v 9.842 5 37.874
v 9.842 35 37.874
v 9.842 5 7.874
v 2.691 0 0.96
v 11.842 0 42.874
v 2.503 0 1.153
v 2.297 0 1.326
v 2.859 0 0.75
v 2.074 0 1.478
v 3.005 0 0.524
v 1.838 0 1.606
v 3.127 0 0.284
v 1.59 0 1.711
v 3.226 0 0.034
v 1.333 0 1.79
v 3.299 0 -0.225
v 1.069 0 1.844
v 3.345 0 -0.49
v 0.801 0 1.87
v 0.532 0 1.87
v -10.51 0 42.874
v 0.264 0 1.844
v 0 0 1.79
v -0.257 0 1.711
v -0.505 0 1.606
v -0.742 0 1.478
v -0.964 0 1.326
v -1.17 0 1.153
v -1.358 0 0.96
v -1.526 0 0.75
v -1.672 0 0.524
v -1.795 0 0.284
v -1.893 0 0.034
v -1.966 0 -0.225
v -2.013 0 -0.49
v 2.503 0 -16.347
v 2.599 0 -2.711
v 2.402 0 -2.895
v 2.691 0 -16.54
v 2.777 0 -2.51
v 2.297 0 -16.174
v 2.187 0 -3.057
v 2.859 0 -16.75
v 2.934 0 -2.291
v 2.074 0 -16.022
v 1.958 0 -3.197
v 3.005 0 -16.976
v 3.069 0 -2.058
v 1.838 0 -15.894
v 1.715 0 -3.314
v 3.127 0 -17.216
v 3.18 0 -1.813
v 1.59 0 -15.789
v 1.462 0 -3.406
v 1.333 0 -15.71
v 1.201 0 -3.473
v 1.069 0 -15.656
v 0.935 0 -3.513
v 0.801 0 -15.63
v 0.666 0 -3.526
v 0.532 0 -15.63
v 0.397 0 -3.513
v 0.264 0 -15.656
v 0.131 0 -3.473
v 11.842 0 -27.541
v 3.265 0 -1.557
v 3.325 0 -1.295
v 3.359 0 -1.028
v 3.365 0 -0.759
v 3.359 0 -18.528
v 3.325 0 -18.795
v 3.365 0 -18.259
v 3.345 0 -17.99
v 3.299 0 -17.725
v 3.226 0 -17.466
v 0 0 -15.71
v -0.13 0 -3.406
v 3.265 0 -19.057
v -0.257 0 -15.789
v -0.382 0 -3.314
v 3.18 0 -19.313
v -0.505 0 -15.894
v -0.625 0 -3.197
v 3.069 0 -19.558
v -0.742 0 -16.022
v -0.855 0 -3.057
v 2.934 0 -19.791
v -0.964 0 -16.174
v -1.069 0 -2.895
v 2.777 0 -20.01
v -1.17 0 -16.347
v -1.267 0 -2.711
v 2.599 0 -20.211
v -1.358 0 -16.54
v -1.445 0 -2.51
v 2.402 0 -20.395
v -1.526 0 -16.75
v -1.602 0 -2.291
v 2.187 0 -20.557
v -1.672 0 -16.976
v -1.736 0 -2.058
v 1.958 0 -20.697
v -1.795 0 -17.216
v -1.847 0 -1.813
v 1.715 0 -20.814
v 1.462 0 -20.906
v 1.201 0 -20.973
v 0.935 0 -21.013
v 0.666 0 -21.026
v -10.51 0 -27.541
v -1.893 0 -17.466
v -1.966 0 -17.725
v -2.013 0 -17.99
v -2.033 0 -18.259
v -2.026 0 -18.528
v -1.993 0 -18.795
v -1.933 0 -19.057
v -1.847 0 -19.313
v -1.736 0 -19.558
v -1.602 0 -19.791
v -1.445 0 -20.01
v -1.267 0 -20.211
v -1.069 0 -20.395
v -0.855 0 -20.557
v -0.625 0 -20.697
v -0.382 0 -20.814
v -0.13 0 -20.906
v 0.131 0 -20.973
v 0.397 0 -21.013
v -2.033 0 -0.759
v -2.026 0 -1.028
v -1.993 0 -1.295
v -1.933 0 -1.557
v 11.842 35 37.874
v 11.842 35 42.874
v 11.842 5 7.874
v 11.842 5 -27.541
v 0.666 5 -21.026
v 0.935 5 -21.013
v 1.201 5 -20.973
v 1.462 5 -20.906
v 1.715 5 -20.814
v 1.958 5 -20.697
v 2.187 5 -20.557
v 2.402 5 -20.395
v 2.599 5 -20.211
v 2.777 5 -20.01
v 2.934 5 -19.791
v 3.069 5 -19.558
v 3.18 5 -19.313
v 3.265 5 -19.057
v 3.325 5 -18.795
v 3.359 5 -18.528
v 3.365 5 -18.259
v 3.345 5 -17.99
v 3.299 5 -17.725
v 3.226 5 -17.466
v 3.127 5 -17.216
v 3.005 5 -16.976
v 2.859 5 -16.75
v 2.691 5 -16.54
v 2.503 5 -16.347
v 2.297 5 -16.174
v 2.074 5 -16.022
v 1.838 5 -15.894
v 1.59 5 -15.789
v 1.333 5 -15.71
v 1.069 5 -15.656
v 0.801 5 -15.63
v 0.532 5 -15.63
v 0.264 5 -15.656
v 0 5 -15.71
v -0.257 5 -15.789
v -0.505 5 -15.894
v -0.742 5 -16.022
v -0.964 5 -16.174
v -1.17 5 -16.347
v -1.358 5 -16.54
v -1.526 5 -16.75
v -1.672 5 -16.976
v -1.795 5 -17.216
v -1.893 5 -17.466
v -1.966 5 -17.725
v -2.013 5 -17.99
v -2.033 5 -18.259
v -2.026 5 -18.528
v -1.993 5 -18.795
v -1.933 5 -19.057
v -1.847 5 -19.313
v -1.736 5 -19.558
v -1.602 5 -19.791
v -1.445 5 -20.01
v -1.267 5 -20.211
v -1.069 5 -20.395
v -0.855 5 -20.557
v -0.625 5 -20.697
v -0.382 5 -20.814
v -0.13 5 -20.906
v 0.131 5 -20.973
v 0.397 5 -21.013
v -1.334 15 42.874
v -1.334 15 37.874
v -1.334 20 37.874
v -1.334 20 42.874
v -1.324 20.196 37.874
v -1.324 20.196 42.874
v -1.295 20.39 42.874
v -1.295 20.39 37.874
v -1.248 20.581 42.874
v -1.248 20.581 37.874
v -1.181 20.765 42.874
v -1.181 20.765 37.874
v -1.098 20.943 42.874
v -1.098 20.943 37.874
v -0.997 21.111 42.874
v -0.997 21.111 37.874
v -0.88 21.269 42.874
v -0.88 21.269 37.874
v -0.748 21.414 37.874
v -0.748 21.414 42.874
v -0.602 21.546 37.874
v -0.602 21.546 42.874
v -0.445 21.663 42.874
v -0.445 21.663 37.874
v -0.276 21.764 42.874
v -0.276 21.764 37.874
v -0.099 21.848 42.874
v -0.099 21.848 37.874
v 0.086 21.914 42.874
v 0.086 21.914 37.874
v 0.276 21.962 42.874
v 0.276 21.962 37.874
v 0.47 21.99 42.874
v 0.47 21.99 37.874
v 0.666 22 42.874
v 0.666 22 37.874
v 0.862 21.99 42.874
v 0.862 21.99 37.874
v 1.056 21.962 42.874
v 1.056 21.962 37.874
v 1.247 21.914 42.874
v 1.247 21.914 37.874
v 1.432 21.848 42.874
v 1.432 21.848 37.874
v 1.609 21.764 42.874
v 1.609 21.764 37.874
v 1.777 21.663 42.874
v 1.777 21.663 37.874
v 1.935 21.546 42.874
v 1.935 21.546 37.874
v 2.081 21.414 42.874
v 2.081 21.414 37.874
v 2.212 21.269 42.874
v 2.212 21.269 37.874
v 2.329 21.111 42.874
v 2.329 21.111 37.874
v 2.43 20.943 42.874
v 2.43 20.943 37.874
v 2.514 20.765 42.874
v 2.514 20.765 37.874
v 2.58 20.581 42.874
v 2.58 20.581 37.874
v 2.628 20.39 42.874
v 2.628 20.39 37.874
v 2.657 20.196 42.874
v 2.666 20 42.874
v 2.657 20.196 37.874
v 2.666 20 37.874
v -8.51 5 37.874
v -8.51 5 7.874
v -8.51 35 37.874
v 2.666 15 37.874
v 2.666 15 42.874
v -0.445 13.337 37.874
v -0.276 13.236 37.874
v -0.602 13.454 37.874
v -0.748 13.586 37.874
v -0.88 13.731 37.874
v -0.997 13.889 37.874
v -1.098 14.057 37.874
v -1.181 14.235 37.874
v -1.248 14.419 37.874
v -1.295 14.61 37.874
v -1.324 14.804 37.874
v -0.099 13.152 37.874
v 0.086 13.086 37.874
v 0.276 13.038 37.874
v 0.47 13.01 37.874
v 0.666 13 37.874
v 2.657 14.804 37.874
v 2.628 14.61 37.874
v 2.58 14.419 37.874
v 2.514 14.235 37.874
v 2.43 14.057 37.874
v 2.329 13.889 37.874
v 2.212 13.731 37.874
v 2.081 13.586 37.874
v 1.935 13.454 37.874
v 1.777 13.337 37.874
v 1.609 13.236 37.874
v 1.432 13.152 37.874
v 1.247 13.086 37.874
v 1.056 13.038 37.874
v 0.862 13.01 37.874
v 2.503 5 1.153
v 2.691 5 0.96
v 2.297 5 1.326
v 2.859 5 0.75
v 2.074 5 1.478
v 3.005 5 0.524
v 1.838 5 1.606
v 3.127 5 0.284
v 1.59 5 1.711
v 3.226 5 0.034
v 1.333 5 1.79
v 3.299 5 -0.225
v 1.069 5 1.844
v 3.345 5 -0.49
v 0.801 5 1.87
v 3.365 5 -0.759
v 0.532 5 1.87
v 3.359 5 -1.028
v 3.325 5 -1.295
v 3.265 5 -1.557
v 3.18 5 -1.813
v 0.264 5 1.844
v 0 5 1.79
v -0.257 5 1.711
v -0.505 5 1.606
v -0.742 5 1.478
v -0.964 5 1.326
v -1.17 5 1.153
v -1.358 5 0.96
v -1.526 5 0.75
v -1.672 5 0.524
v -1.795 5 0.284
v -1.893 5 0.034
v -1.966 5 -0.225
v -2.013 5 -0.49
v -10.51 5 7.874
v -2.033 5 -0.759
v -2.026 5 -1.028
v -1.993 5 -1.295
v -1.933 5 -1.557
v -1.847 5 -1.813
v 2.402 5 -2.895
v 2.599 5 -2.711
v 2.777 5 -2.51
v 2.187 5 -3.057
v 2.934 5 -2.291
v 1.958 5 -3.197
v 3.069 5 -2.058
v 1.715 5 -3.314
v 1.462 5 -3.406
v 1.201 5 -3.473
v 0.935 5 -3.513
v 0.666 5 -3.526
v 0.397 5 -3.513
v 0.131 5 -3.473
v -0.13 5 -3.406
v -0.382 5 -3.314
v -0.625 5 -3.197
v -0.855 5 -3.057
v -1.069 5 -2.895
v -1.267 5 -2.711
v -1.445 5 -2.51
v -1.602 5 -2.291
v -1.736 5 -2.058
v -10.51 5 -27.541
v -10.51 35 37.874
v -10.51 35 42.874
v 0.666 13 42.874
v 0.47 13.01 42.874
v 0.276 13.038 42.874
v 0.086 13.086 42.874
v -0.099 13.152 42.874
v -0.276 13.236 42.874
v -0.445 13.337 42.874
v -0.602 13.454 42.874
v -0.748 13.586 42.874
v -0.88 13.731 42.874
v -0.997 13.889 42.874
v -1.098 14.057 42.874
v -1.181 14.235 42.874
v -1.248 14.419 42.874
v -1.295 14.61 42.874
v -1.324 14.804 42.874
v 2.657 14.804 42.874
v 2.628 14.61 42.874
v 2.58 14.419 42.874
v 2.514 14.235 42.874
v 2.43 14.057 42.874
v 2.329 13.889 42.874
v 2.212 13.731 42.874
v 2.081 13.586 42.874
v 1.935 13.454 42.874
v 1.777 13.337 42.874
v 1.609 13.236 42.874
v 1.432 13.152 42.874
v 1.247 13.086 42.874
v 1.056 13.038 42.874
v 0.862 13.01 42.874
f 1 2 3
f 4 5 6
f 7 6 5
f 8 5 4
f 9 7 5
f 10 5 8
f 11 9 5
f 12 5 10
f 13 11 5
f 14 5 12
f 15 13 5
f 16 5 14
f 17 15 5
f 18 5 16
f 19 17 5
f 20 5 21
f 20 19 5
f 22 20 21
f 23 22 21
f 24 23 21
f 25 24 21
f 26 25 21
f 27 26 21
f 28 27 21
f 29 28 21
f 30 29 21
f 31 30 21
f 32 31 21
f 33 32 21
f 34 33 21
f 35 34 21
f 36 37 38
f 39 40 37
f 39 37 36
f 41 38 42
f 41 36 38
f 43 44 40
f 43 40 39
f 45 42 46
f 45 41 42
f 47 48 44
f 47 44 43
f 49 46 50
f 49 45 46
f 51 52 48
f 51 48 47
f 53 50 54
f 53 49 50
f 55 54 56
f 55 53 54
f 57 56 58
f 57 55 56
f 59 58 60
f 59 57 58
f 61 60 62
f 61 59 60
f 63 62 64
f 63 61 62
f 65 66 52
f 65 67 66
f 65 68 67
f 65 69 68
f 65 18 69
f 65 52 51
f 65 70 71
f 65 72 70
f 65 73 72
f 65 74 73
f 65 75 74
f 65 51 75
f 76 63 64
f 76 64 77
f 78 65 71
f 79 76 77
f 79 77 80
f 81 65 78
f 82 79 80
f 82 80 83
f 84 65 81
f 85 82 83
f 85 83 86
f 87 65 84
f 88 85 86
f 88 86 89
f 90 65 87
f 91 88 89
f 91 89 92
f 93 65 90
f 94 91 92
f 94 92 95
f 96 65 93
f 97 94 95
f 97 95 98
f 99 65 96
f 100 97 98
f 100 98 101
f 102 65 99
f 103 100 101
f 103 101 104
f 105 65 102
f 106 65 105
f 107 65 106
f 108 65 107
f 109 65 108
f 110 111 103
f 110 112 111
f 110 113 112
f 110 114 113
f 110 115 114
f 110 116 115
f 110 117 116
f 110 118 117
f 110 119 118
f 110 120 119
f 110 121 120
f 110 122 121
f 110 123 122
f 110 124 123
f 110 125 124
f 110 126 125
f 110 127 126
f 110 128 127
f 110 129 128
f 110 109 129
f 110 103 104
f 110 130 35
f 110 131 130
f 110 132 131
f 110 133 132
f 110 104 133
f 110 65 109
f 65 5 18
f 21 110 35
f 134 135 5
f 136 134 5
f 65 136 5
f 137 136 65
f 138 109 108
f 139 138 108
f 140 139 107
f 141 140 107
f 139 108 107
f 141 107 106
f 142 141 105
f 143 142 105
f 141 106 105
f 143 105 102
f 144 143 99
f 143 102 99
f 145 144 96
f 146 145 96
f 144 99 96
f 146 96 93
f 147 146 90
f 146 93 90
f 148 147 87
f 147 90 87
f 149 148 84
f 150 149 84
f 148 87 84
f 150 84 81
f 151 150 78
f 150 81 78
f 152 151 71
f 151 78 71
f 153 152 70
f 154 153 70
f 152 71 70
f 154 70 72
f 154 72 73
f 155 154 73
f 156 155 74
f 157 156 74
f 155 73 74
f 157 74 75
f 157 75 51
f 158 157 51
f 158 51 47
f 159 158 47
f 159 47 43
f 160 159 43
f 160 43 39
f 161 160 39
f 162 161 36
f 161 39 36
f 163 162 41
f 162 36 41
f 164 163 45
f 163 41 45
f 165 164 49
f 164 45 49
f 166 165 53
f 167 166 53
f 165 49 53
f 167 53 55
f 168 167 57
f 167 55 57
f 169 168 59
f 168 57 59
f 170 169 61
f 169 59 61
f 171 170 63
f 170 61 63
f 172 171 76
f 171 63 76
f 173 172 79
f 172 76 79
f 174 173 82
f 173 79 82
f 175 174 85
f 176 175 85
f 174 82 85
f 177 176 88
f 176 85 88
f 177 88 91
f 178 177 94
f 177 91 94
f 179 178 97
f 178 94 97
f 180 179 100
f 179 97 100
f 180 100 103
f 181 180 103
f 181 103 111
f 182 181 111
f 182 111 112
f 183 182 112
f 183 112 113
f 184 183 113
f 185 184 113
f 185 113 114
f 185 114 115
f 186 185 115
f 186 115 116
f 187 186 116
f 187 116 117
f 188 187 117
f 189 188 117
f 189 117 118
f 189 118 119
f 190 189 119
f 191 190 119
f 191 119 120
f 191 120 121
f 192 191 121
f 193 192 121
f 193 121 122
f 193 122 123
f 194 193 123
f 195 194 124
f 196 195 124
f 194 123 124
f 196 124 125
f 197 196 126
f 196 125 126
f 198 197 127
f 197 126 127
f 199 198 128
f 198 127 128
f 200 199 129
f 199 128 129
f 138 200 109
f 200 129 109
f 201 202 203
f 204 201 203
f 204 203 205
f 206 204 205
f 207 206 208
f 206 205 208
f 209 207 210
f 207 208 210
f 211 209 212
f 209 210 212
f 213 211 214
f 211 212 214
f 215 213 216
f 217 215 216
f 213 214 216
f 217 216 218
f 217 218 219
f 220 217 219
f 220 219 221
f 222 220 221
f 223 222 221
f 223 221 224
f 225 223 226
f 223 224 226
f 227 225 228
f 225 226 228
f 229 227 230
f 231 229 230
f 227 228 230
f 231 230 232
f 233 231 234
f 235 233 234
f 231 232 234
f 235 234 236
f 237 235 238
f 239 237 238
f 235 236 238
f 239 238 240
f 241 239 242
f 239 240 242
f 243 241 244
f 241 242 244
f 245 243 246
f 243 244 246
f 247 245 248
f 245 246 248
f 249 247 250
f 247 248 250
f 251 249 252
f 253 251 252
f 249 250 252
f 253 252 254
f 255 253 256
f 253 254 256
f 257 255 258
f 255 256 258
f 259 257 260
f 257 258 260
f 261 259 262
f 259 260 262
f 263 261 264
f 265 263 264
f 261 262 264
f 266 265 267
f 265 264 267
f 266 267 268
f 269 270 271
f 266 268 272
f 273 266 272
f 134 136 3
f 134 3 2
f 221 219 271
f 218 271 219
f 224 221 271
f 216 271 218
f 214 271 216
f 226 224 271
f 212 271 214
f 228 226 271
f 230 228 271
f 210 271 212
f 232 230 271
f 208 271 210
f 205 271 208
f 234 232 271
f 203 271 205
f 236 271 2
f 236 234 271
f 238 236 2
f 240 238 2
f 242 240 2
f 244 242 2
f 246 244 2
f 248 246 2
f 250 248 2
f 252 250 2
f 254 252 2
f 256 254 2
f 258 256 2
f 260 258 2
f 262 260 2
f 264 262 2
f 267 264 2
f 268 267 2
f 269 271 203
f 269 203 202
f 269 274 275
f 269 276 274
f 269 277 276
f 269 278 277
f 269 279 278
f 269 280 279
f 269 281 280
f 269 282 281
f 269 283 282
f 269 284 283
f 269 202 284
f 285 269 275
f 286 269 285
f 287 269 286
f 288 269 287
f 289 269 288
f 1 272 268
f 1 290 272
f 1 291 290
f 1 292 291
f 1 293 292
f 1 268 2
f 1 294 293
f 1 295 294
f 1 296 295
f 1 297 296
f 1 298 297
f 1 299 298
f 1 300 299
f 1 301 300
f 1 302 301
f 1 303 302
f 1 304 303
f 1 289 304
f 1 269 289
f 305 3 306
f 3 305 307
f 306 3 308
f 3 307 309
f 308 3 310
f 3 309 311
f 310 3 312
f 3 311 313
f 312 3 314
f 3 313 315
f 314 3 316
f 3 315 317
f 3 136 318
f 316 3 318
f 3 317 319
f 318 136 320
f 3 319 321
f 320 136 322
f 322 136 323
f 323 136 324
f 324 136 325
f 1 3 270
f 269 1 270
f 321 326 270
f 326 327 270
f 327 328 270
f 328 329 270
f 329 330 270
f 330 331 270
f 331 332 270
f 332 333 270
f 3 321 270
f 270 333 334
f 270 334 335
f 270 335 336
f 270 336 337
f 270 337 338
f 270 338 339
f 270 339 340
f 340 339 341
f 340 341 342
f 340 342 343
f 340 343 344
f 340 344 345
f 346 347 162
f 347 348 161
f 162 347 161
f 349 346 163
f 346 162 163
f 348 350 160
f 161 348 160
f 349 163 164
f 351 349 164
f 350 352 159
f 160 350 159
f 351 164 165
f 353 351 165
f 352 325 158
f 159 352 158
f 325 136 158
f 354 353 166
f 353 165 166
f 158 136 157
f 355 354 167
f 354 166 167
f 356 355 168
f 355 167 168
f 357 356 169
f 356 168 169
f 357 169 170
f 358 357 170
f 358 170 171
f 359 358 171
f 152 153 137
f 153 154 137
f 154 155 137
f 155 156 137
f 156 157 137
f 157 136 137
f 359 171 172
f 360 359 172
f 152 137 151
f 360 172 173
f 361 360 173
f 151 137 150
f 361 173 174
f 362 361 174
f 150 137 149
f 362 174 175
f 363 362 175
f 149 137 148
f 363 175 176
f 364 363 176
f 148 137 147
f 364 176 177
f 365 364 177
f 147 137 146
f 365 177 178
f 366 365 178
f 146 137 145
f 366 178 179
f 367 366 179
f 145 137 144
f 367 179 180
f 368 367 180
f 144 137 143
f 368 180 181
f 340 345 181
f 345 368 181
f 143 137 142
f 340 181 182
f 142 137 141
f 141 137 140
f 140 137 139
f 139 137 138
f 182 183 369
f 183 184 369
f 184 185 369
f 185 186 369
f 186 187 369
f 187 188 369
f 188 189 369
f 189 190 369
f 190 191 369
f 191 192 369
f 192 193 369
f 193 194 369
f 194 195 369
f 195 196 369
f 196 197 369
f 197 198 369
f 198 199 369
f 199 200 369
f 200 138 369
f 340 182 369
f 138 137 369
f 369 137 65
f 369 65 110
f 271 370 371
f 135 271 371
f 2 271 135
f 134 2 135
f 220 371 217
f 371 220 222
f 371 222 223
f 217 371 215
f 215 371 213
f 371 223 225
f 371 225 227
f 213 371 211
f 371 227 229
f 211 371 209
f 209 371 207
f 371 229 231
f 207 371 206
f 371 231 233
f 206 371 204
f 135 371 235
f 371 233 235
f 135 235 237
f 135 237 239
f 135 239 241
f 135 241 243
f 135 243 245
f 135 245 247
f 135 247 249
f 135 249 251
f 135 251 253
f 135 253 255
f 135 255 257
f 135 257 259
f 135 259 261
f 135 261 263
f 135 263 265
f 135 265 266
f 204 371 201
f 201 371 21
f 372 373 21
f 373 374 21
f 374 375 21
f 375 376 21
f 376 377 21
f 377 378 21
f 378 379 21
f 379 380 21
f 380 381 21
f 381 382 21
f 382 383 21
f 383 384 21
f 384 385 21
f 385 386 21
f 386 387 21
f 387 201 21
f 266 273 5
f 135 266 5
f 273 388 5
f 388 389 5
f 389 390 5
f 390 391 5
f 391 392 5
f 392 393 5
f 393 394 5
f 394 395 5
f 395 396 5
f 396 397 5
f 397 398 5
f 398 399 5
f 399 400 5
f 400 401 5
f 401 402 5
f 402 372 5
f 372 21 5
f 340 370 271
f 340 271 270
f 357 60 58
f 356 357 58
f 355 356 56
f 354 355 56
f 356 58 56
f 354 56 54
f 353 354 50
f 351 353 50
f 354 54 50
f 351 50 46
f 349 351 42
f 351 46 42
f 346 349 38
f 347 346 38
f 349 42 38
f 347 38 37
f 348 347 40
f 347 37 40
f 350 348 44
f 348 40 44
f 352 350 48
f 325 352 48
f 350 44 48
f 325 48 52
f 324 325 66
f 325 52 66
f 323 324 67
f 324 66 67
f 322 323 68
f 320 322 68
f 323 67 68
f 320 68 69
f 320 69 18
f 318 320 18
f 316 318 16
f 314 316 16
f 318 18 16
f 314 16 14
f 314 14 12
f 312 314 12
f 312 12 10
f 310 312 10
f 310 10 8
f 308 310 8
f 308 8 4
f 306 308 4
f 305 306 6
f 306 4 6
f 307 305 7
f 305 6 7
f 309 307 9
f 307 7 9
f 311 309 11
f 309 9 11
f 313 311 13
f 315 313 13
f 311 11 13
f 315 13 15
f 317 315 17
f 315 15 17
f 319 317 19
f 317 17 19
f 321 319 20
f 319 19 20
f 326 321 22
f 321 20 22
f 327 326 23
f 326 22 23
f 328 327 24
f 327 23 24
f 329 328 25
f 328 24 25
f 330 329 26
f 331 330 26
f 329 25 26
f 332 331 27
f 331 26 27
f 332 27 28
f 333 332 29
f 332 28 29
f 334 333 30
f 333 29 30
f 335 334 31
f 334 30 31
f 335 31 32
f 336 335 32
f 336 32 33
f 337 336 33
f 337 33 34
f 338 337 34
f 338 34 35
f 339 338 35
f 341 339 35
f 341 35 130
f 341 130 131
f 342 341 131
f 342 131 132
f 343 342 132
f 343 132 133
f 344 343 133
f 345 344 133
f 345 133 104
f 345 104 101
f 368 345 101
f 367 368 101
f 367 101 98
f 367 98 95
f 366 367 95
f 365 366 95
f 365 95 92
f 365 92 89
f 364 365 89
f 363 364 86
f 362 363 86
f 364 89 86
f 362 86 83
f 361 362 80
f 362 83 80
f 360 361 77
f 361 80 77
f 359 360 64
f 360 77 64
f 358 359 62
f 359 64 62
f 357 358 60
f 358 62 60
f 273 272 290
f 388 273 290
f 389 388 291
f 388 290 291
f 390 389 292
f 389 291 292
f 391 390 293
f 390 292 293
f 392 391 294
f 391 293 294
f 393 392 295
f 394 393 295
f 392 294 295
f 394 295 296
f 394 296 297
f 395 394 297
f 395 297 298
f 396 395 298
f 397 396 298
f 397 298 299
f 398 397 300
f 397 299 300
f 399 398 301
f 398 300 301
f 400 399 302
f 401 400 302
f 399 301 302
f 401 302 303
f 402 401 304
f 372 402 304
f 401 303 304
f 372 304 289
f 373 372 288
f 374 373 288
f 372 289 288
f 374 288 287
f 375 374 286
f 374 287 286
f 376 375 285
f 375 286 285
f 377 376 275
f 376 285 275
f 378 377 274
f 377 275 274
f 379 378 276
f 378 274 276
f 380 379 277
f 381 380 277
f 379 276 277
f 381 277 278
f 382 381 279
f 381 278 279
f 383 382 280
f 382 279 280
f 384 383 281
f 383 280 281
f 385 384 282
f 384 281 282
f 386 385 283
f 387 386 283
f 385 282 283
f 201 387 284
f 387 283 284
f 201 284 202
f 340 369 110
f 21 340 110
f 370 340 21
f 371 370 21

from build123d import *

# Parameters (mm, degrees)
SKETCH1_R           = 2.7
BOSS_EXTRUDE1_DEPTH = 5
SKETCH2_W           = 22.352
SKETCH2_H           = 5
BOSS_EXTRUDE2_DEPTH = 30
CUT_EXTRUDE1_DEPTH  = 5
BOSS_EXTRUDE3_DEPTH = 2
BOSS_EXTRUDE4_DEPTH = 2
SKETCH7_W           = 22.352
SKETCH7_H           = 36.907486172
BOSS_EXTRUDE5_DEPTH = 5
SKETCH8_R           = 2.7
CUT_EXTRUDE2_DEPTH  = 5
SKETCH9_W           = 22.352
SKETCH9_H           = 5
CUT_EXTRUDE3_DEPTH  = 15


with BuildPart() as part:
    # Sketch1 → Boss-Extrude1 (new body)
    with BuildSketch(Plane(origin=(0, 0, 0), x_dir=(1, 0, 0), z_dir=(0, 1, 0))):
        Polygon((0.666305019, -42.873782933), (-10.509694981, -42.873782933), (-10.509694981, -15.816806264), (-10.509694981, 42.540630423), (11.842305019, 42.540630423), (11.842305019, -42.873782933), align=None)
        with Locations(Location((0.666305019, 31.319617067, 0), (0, 0, 270))):
            Circle(SKETCH1_R, mode=Mode.SUBTRACT)
        with Locations(Location((0.666305019, 14.250817067, 0), (0, 0, 270))):
            Circle(SKETCH1_R, mode=Mode.SUBTRACT)
    extrude(amount=BOSS_EXTRUDE1_DEPTH)

    # Sketch2 → Boss-Extrude2 (add)
    with BuildSketch(Plane(origin=(0, 5, 0), x_dir=(1, 0, 0), z_dir=(0, 1, 0))):
        with Locations((0.666305019, -40.373782933)):
            Rectangle(SKETCH2_W, SKETCH2_H)
    extrude(amount=BOSS_EXTRUDE2_DEPTH)

    # Sketch3 → Cut-Extrude1 (cut)
    with BuildSketch(Plane(origin=(0, 0, 37.873782933), x_dir=(-1, 0, 0), z_dir=(0, 0, -1))):
        with BuildLine():
            Line((-2.666305019, 20), (-2.666305019, 15))
            ThreePointArc((-2.666305019, 15), (-0.666305019, 13), (1.333694981, 15))
            Line((1.333694981, 15), (1.333694981, 20))
            ThreePointArc((1.333694981, 20), (-0.666305019, 22), (-2.666305019, 20))
        make_face()
    extrude(amount=-CUT_EXTRUDE1_DEPTH, mode=Mode.SUBTRACT)

    # Sketch4 → Boss-Extrude3 (add)
    with BuildSketch(Plane(origin=(11.842305019, 0, 0), x_dir=(0, 0, -1), z_dir=(1, 0, 0))):
        Polygon((-37.873782933, 35), (-37.873782933, 5), (-7.873782933, 5), align=None)
    extrude(amount=-BOSS_EXTRUDE3_DEPTH)

    # Sketch5 → Boss-Extrude4 (add)
    with BuildSketch(Plane.ZY.offset(10.509694981)):
        Polygon((37.873782933, 35), (7.873782933, 5), (37.873782933, 5), align=None)
    extrude(amount=-BOSS_EXTRUDE4_DEPTH)

    # Sketch7 → Boss-Extrude5 (add)
    with BuildSketch(Plane.XZ):
        with Locations((0.666305019, -24.086887337)):
            Rectangle(SKETCH7_W, SKETCH7_H)
    extrude(amount=-BOSS_EXTRUDE5_DEPTH)

    # Sketch8 → Cut-Extrude2 (cut)
    with BuildSketch(Plane.XZ):
        with Locations(Location((0.666305019, -0.826217067, 0), (0, 0, 270))):
            Circle(SKETCH8_R)
        with Locations(Location((0.666305019, -18.326217067, 0), (0, 0, 270))):
            Circle(SKETCH8_R)
    extrude(amount=-CUT_EXTRUDE2_DEPTH, mode=Mode.SUBTRACT)

    # Sketch9 → Cut-Extrude3 (cut)
    with BuildSketch(Plane(origin=(0, 0, -42.540630423), x_dir=(-1, 0, 0), z_dir=(0, 0, -1))):
        with Locations((-0.666305019, 2.5)):
            Rectangle(SKETCH9_W, SKETCH9_H)
    extrude(amount=-CUT_EXTRUDE3_DEPTH, mode=Mode.SUBTRACT)


solid = part.part
